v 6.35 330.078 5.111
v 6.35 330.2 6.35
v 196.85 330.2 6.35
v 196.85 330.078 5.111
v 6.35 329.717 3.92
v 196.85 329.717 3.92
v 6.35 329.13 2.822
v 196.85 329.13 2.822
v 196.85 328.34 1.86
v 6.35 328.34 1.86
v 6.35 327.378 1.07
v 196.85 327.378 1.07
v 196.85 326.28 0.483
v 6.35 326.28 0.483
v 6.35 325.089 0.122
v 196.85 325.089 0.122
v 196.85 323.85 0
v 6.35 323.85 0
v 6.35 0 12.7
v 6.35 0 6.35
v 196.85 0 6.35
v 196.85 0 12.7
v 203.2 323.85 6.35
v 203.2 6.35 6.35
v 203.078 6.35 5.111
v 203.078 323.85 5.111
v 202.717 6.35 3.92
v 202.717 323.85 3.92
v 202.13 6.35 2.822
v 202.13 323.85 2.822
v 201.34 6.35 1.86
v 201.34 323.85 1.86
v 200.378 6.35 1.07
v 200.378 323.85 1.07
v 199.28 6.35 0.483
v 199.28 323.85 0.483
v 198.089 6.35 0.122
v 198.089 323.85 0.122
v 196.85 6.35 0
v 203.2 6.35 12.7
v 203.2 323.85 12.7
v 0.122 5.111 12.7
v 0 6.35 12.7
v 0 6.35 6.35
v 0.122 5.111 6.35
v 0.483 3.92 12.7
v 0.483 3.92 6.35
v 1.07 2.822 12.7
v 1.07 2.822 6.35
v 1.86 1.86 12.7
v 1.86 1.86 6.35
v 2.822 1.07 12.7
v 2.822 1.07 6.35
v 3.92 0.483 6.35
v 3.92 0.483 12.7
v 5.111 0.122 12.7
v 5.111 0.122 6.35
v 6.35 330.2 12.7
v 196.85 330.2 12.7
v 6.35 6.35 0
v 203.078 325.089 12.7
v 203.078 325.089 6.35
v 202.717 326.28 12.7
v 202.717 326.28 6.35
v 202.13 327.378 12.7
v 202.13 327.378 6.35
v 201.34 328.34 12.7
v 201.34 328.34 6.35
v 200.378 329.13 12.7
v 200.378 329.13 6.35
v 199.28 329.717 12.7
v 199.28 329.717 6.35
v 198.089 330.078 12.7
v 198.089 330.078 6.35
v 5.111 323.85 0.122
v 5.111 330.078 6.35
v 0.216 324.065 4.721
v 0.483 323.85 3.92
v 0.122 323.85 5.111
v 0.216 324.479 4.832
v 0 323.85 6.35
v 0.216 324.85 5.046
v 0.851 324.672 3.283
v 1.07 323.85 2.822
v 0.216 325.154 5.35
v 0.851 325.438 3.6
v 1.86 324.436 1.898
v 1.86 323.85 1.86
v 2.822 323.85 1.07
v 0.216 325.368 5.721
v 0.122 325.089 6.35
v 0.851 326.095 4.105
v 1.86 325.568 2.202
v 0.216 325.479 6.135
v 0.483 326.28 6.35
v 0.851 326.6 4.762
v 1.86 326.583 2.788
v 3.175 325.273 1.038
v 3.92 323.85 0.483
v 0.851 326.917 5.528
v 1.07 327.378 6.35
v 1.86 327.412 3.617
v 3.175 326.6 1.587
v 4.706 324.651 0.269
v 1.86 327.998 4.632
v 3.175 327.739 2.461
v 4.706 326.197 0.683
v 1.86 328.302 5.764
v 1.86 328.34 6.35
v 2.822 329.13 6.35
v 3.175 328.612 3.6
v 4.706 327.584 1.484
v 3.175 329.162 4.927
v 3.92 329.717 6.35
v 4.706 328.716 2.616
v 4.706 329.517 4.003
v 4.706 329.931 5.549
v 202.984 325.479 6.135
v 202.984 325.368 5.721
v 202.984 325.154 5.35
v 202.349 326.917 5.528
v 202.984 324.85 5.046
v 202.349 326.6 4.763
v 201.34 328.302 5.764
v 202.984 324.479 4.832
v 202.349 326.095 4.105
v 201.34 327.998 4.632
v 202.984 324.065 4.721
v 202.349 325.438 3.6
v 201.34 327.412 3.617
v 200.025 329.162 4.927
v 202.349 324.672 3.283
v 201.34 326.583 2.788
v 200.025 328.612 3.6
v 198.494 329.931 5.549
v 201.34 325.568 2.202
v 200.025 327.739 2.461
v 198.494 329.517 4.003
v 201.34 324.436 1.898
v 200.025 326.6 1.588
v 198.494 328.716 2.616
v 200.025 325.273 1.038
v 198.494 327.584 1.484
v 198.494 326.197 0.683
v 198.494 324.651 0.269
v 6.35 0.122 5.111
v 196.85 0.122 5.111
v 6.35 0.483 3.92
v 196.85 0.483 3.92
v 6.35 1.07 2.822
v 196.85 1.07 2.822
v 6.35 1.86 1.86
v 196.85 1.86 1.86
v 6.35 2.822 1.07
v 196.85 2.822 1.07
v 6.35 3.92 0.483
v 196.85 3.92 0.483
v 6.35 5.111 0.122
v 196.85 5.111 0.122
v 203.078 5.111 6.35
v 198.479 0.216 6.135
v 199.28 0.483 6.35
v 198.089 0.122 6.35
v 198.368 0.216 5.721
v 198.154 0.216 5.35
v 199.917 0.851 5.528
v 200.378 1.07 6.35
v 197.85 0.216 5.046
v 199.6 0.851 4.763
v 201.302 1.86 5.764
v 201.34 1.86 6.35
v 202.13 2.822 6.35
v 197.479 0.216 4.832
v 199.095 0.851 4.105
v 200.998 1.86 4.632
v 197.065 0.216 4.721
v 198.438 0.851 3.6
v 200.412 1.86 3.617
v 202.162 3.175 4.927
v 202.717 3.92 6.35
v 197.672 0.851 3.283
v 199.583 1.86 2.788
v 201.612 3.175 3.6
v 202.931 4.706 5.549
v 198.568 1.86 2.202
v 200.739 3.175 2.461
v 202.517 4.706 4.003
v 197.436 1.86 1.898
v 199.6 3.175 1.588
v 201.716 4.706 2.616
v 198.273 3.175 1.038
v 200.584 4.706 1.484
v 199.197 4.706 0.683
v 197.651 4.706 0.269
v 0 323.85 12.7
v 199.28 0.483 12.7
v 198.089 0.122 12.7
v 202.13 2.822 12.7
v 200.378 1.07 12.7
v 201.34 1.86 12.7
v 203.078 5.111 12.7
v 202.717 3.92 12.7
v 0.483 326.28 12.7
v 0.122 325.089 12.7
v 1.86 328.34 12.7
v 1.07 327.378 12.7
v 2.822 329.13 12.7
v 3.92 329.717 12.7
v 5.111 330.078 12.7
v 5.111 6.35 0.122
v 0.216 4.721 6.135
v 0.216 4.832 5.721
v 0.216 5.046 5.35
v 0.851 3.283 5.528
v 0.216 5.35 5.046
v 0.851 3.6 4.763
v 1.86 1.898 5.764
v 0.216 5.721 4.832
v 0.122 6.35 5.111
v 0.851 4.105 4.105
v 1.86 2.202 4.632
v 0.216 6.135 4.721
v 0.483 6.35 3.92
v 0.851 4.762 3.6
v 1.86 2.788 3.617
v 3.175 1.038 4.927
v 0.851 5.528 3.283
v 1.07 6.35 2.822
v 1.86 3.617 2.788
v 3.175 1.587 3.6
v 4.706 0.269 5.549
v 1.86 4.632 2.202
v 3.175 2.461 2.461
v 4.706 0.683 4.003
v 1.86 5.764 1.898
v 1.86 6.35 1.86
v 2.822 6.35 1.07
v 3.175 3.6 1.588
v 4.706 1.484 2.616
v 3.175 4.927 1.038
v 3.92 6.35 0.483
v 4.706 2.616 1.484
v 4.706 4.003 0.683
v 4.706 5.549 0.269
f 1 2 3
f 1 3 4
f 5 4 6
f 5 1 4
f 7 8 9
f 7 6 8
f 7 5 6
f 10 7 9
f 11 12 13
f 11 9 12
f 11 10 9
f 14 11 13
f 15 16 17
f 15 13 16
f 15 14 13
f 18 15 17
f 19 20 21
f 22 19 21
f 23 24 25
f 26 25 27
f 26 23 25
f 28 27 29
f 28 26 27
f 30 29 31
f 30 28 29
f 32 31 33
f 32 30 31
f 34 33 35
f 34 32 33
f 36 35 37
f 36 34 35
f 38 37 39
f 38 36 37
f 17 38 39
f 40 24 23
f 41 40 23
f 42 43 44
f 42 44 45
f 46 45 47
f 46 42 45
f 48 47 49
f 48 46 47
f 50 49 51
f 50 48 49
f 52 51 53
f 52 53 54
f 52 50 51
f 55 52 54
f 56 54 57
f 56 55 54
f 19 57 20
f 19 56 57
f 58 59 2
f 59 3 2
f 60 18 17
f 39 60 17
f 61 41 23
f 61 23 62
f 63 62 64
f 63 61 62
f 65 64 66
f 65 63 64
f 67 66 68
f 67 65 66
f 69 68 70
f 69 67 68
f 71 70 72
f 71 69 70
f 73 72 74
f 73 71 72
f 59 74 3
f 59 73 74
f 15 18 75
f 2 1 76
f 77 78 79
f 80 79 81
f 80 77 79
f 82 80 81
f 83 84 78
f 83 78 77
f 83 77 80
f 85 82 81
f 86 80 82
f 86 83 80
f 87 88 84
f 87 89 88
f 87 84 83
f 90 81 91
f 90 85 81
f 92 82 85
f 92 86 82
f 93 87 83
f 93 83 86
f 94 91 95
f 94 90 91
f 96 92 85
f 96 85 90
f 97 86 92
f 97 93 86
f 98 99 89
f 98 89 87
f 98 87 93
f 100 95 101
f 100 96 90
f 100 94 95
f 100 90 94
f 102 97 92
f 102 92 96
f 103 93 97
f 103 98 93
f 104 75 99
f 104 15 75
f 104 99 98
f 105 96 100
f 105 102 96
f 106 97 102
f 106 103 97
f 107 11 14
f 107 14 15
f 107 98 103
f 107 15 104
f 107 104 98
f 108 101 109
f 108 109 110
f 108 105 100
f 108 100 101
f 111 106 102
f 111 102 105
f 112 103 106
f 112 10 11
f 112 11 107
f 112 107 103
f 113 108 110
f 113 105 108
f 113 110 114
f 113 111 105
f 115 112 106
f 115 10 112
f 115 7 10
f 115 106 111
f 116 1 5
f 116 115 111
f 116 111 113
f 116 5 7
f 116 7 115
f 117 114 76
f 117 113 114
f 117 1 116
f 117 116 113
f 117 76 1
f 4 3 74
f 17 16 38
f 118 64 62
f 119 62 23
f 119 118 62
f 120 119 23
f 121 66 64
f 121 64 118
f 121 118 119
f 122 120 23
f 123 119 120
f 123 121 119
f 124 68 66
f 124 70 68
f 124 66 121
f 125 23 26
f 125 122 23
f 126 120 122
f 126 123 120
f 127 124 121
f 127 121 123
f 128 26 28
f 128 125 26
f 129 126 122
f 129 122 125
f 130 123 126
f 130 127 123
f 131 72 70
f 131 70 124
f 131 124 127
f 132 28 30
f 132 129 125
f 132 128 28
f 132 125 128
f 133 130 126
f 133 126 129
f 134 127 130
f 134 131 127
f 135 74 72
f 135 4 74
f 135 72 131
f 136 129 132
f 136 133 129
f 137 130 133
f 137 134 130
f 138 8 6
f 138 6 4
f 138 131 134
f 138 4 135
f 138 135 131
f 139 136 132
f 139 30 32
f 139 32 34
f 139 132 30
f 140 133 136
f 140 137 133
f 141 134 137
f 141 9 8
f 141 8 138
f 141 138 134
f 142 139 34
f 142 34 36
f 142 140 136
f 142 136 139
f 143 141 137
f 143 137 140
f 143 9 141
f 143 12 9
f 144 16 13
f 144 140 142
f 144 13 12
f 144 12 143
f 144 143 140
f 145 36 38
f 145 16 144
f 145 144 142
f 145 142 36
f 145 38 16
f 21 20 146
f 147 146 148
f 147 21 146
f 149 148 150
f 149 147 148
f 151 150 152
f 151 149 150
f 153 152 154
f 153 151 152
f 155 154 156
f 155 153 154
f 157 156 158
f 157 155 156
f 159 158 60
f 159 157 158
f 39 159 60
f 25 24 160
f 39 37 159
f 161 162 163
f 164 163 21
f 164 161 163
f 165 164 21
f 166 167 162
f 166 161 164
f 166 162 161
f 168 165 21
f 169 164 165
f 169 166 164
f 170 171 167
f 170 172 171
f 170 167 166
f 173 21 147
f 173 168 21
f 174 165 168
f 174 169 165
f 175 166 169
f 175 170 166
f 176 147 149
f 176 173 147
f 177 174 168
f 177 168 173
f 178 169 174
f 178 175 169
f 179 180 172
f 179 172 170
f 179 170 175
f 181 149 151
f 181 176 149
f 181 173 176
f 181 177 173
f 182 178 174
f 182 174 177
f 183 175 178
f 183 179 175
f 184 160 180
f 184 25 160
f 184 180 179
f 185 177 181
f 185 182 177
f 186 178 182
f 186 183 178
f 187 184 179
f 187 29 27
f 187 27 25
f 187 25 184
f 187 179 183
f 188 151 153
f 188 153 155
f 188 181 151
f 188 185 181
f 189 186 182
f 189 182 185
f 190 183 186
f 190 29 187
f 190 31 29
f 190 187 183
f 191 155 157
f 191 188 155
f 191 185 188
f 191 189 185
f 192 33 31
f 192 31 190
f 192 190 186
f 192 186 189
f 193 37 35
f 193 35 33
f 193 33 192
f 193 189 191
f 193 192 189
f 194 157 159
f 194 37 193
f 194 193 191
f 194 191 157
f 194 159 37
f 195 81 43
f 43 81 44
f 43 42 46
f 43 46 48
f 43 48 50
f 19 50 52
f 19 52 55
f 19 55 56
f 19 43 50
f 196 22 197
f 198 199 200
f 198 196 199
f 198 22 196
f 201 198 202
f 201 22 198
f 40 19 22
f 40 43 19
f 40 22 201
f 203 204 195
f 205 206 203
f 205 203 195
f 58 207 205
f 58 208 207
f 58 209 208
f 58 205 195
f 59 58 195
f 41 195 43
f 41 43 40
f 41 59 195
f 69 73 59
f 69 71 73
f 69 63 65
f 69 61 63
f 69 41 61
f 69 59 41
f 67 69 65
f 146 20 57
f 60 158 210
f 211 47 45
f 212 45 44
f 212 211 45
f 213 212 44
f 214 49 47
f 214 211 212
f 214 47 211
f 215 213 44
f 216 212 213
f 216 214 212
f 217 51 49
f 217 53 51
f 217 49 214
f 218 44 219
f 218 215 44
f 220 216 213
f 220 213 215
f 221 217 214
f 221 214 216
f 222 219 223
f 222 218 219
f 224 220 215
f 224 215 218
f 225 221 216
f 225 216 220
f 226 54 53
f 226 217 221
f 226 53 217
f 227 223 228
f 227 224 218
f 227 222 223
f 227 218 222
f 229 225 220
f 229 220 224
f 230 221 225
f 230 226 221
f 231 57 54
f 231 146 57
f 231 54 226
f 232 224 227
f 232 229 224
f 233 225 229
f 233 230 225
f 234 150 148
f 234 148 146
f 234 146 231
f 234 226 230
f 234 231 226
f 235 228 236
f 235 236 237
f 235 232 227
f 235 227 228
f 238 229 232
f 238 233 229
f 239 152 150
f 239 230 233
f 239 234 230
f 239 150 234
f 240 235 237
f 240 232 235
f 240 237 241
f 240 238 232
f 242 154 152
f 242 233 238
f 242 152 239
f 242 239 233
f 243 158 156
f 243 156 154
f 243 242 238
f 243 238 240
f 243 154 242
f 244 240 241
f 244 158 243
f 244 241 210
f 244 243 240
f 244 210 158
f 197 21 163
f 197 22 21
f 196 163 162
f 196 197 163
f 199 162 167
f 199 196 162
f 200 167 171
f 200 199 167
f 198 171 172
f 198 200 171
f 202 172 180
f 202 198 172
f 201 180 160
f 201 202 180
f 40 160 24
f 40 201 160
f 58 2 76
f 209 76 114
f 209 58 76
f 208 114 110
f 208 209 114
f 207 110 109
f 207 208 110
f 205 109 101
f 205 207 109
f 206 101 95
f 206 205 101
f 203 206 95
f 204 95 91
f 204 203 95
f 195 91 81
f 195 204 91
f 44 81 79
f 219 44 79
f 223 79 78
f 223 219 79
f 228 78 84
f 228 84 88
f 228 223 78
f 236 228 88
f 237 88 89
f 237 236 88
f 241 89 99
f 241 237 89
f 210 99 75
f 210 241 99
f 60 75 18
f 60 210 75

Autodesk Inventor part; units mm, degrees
ref_plane "YZ Plane" through (0, 0, 0) normal (1, 0, 0) x (0, 1, 0)
ref_plane "XZ Plane" through (0, 0, 0) normal (0, 1, 0) x (-1, 0, 0)
ref_plane "XY Plane" through (0, 0, 0) normal (0, 0, 1) x (1, 0, 0)
sketch "Sketch1" plane through (0, 0, 0) normal (0, 0, 1) x (1, 0, 0)
  line L0 (0, 0) -> (203.2, 0)
  line L1 (203.2, 0) -> (203.2, 330.2)
  line L2 (203.2, 330.2) -> (0, 330.2)
  line L3 (0, 330.2) -> (0, 0)
  dimension "d7" = 203.2
  dimension "d8" = 330.2
extrude "Extrusion1" add sketch "Sketch1" along normal blind 12.7
fillet "Fillet1" radius 6.35 8 edges at (101.6, 330.2, 0) (203.2, 165.1, 0) (203.2, 330.2, 6.35) (0, 330.2, 6.35) (101.6, 0, 0) (0, 165.1, 0) (0, 0, 6.35) (203.2, 0, 6.35)
properties material "MDF Medium Density Fiberboard"
